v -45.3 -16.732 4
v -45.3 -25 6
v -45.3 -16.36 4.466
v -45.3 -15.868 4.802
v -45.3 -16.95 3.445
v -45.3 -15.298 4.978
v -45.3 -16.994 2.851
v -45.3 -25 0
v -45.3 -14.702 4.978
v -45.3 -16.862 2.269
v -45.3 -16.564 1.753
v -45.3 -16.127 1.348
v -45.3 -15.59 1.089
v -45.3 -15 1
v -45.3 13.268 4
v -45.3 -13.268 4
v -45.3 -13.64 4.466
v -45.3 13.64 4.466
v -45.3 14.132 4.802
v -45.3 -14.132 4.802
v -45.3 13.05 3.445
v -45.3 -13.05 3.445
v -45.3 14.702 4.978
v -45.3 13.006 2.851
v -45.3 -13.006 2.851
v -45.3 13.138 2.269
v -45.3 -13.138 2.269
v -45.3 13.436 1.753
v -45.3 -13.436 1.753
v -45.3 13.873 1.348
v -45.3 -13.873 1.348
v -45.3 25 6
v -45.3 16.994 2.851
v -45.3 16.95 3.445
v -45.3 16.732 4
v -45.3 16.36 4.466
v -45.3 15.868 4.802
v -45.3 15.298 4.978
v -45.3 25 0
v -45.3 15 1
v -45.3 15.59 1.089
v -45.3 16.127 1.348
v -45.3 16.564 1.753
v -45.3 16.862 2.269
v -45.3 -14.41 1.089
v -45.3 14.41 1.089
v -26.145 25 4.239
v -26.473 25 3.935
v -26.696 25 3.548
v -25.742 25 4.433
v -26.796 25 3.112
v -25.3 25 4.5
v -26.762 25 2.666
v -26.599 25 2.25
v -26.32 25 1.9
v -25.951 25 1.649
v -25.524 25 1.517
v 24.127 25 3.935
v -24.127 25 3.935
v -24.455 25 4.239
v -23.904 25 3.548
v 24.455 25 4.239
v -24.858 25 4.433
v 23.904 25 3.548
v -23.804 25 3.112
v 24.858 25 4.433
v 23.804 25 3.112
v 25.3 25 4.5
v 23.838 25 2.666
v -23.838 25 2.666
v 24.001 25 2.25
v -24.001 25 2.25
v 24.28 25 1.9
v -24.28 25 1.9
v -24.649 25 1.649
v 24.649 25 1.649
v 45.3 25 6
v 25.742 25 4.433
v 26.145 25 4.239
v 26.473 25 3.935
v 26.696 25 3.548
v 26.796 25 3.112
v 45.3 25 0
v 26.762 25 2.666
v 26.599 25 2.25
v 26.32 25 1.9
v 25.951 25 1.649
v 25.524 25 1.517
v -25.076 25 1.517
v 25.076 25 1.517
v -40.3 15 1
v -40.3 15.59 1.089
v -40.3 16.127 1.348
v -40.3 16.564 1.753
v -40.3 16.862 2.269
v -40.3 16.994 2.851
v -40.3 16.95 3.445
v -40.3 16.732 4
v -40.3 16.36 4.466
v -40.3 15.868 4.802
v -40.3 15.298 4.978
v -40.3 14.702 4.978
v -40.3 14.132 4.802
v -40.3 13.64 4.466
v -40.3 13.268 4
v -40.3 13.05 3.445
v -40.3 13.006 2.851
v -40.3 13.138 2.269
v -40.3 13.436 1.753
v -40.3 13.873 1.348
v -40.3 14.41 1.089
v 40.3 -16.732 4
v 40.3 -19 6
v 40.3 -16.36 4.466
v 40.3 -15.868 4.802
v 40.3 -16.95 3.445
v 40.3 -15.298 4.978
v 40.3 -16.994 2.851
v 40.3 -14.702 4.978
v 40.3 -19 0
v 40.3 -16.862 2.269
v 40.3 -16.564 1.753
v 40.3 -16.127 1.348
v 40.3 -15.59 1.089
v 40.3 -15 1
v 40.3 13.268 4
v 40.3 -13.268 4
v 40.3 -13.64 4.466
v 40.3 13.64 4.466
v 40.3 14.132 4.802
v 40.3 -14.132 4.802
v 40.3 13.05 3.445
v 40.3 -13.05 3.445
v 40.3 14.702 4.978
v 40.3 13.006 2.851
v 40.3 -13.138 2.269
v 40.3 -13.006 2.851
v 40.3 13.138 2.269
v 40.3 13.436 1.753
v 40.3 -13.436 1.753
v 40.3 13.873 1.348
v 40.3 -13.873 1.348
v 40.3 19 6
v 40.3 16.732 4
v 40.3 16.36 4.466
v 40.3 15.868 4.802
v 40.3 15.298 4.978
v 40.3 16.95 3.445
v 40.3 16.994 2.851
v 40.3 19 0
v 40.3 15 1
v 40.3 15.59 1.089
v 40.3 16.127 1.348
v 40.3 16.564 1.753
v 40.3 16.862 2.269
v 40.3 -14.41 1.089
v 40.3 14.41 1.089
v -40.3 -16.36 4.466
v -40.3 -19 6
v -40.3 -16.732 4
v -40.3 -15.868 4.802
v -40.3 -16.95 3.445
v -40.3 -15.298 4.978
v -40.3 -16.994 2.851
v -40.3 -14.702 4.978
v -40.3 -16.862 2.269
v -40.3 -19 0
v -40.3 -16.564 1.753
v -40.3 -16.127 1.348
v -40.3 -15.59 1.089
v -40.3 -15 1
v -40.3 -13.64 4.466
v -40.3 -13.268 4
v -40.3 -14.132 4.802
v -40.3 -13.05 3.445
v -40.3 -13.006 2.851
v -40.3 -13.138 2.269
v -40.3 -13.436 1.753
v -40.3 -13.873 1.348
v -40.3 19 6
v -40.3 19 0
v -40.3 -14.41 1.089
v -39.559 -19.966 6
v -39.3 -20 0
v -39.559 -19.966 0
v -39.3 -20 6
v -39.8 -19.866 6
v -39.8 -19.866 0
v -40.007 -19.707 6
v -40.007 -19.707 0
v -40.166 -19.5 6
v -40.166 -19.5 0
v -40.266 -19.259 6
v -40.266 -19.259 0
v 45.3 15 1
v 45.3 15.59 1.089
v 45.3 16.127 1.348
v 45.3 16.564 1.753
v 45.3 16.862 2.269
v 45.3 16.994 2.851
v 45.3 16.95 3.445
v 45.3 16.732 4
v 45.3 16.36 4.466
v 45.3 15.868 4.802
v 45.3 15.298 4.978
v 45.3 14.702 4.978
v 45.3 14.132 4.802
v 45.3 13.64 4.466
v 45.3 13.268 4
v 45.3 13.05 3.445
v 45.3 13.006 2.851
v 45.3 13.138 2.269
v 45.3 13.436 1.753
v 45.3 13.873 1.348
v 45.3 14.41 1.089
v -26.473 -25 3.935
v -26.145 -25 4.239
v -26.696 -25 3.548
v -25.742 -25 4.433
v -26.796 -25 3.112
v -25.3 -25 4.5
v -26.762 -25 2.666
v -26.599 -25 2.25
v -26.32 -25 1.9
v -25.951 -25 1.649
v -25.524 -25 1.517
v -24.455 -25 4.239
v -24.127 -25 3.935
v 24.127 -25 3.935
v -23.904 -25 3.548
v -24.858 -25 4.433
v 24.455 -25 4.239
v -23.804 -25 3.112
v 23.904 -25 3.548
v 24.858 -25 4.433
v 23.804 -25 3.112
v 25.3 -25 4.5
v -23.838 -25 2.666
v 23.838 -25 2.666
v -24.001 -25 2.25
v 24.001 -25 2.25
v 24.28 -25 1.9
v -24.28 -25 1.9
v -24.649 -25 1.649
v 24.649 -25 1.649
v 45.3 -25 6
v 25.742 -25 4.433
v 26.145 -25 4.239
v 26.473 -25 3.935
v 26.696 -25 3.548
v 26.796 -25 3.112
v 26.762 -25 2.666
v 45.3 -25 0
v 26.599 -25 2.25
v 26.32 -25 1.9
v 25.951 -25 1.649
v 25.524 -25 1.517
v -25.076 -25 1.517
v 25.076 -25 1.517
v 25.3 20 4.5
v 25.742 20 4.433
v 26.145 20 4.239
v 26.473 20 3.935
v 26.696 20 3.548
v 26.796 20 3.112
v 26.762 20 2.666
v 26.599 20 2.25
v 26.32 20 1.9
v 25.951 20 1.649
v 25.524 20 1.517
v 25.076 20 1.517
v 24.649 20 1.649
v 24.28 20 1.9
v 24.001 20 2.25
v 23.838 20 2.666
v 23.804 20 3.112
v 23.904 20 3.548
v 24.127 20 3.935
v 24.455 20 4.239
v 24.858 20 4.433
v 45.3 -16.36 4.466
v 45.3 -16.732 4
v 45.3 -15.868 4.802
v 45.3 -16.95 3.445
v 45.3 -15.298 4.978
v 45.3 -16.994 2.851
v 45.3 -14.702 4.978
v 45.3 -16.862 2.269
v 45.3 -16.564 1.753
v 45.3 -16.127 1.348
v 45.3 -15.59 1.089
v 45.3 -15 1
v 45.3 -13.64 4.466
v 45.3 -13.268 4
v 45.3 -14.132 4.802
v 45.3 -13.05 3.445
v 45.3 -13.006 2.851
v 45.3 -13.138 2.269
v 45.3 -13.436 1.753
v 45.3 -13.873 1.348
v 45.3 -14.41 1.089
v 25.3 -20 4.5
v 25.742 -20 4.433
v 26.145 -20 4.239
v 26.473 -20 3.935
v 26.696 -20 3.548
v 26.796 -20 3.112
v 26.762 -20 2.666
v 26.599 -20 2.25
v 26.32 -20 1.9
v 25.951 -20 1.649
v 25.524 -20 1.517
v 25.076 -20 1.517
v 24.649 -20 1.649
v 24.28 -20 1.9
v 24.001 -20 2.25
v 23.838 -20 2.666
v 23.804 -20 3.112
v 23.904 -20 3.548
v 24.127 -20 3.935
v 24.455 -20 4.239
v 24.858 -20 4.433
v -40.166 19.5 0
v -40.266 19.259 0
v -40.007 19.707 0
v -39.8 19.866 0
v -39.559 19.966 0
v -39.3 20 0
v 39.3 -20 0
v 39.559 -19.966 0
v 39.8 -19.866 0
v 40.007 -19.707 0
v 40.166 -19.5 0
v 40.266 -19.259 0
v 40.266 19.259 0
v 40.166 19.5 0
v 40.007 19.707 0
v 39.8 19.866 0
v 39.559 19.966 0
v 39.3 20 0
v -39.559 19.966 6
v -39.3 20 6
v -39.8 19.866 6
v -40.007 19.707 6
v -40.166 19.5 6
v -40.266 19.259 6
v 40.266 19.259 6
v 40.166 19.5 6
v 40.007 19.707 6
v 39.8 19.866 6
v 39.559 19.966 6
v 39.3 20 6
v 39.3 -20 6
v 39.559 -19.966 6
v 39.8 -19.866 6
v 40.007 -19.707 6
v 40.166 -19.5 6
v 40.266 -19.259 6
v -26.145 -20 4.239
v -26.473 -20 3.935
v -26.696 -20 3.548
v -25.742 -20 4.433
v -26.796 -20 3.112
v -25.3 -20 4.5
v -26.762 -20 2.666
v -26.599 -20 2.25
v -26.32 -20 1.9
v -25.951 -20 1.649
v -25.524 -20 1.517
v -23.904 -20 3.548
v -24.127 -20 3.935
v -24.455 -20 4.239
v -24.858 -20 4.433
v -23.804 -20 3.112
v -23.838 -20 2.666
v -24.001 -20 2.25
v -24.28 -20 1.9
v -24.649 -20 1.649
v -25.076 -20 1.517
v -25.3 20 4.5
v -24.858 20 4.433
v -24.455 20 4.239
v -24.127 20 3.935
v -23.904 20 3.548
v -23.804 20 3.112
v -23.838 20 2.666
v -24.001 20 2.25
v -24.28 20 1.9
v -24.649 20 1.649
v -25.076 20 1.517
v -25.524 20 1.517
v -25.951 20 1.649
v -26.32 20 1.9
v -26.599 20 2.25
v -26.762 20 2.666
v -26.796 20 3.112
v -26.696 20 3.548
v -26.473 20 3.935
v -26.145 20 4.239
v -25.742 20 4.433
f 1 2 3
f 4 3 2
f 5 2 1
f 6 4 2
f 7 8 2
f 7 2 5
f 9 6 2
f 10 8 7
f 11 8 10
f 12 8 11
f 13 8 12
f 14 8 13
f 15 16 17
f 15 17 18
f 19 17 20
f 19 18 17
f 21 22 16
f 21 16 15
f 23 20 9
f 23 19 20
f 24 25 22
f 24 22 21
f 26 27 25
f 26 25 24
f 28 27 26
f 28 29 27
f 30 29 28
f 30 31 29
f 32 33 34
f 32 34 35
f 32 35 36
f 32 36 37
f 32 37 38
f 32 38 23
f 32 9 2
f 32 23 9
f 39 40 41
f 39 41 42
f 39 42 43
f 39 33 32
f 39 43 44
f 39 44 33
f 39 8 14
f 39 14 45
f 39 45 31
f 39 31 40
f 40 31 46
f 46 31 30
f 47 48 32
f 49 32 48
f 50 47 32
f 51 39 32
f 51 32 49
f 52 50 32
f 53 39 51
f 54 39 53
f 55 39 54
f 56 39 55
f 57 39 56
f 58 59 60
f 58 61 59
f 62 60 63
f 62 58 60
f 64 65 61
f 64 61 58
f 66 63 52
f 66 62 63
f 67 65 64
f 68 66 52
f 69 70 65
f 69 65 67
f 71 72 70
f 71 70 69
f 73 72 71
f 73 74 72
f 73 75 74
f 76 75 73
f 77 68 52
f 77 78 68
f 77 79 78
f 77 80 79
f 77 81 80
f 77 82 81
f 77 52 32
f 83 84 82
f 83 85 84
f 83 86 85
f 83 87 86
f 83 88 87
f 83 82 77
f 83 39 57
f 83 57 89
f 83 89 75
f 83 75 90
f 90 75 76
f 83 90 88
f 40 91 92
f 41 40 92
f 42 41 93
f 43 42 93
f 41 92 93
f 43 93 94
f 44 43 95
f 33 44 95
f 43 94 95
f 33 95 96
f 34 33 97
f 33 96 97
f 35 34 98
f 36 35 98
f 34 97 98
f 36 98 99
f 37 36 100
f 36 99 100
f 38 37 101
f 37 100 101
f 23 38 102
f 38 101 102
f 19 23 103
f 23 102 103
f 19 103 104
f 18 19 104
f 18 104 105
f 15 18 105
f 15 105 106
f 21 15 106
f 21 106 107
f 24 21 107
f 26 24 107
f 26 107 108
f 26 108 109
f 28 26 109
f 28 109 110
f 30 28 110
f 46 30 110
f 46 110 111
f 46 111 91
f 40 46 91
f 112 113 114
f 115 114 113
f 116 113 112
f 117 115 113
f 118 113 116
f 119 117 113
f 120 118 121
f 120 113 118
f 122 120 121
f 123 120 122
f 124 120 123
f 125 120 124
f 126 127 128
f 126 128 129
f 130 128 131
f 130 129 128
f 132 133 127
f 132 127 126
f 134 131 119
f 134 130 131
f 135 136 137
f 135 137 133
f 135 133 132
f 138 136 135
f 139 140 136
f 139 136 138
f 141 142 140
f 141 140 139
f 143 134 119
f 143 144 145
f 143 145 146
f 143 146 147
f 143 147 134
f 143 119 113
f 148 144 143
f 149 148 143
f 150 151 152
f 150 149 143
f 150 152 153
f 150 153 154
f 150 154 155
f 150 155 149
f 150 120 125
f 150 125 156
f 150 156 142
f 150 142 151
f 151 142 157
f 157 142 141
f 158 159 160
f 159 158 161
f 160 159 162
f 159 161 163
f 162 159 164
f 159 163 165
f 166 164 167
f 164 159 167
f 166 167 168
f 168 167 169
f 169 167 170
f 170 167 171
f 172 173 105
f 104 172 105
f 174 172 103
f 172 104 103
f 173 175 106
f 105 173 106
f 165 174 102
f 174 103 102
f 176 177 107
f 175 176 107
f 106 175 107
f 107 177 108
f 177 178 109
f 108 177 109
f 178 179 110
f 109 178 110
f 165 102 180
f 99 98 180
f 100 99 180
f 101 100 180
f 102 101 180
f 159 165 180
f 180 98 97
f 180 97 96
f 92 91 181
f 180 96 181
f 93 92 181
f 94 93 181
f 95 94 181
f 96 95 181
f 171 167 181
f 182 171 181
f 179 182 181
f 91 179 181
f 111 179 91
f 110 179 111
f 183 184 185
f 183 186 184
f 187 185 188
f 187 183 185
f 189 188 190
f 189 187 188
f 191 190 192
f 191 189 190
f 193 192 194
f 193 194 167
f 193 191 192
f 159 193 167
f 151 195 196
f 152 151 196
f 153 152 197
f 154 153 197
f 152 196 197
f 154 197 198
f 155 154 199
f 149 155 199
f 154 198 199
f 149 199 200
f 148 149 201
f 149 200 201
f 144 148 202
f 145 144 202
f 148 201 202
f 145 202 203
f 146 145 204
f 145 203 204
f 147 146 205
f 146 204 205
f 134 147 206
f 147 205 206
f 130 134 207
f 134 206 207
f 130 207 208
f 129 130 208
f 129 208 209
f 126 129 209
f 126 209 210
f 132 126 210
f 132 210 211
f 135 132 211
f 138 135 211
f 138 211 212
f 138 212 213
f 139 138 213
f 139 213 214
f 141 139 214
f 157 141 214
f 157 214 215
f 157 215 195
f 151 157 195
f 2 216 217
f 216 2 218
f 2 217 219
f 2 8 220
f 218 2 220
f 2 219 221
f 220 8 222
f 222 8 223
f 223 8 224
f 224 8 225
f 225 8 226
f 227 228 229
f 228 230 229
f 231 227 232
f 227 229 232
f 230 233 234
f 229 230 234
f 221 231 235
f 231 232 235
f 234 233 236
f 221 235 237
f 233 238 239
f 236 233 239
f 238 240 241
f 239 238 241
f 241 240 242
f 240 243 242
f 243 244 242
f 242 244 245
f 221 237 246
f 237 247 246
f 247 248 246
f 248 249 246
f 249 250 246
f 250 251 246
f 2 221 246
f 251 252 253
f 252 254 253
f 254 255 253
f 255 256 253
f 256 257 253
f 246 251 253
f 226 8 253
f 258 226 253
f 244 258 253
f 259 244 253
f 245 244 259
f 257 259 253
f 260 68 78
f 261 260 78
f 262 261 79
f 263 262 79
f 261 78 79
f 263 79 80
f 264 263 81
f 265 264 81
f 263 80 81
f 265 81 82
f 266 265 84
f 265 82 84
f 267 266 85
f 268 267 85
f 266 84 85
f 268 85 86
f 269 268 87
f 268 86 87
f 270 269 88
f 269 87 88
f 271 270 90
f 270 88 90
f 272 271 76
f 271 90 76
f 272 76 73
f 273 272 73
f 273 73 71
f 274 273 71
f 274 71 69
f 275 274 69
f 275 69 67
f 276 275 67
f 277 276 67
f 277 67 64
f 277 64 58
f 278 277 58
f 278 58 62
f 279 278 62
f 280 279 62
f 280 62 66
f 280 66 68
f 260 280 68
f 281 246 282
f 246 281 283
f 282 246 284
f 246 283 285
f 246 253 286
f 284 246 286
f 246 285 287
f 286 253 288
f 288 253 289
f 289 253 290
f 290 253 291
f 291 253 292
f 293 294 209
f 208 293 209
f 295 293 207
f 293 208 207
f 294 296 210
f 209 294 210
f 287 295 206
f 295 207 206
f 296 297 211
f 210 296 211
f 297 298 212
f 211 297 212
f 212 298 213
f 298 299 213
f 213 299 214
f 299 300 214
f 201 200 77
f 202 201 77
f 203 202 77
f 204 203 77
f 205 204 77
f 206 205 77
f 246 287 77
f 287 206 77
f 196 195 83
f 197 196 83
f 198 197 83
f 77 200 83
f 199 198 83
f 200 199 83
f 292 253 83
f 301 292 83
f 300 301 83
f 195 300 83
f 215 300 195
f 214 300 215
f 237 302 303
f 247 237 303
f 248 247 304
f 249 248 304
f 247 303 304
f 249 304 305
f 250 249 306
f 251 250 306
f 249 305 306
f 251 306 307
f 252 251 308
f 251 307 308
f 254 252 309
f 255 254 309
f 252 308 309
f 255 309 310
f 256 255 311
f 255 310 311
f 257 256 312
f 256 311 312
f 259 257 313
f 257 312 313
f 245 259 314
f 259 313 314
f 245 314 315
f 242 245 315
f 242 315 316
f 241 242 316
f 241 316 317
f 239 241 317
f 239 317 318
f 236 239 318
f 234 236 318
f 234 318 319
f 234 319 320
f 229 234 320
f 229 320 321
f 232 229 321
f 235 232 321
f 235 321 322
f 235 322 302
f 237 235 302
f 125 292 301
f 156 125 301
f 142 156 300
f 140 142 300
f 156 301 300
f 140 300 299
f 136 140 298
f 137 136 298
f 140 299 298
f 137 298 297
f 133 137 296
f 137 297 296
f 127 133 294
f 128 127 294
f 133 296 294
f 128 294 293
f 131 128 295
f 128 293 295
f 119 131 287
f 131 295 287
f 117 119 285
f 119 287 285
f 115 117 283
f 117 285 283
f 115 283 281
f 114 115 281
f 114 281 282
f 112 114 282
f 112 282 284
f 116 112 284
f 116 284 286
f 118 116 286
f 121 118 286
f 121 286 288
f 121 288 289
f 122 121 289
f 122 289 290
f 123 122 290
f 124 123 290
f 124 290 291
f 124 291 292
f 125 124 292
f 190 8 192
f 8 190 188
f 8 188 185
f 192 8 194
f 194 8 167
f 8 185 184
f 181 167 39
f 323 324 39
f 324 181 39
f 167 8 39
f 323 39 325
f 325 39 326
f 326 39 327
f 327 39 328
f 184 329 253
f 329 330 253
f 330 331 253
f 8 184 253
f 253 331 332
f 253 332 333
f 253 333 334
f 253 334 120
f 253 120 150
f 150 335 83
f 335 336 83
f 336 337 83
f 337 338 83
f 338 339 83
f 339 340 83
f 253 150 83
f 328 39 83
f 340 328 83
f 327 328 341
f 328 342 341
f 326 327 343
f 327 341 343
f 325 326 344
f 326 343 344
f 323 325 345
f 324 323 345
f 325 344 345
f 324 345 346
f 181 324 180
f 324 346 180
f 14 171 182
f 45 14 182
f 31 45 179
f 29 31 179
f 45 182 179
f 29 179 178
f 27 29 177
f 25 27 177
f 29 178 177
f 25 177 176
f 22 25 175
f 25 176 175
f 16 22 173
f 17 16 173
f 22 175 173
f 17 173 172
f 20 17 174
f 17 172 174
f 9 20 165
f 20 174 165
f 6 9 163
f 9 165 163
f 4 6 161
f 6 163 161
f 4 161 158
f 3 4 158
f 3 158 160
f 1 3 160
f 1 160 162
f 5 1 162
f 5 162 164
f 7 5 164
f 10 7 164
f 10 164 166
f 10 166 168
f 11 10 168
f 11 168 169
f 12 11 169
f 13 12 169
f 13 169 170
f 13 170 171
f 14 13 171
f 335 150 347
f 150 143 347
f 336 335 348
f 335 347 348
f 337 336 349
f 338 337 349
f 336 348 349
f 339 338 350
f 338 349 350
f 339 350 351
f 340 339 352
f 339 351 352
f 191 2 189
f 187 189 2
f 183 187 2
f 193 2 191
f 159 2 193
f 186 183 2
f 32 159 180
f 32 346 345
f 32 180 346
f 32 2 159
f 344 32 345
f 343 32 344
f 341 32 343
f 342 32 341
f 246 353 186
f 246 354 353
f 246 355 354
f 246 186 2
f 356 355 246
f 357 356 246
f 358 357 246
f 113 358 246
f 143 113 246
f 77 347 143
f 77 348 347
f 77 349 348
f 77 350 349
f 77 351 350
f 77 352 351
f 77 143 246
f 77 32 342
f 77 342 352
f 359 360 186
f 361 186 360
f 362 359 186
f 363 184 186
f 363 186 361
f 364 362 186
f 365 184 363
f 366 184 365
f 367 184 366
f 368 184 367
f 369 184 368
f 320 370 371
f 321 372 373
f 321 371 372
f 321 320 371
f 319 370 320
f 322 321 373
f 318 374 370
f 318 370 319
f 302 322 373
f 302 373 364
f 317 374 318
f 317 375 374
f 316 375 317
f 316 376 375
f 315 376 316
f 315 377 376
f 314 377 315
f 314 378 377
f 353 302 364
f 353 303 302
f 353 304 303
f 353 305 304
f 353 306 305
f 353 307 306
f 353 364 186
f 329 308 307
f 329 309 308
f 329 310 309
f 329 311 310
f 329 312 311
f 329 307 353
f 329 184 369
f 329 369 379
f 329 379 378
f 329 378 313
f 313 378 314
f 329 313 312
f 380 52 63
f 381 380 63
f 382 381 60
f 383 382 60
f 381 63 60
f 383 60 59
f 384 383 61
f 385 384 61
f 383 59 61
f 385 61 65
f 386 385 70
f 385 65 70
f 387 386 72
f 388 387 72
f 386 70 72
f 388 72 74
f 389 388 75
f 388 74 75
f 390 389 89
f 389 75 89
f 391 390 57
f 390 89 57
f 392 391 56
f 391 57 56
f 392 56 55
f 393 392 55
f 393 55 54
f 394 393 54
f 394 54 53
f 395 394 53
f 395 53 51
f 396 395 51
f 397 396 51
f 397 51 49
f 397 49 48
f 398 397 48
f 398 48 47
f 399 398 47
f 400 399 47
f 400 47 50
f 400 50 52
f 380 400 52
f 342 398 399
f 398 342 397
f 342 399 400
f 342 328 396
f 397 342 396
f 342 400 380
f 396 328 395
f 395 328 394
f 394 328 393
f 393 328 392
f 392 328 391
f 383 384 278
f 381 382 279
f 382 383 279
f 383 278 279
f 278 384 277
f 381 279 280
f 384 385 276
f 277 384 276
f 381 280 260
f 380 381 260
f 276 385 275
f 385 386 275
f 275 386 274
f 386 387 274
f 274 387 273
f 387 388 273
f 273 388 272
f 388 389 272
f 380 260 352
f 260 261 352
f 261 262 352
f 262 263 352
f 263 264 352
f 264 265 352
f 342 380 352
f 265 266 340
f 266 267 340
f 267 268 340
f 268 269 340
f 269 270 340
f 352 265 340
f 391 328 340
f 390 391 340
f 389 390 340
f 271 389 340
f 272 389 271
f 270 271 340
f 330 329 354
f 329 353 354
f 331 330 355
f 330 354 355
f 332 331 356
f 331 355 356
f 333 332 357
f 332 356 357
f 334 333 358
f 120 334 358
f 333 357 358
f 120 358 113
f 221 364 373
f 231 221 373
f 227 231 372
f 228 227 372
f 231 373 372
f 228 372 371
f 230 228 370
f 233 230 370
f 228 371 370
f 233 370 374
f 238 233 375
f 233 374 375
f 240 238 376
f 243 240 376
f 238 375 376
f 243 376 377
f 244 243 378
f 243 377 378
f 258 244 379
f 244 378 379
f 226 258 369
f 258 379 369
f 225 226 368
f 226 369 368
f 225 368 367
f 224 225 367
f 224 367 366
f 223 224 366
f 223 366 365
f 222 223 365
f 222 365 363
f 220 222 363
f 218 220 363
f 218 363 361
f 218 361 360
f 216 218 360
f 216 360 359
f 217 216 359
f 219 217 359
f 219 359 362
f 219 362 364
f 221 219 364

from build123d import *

# Parameters (mm, degrees)
SKETCH_1_W          = 90.6
SKETCH_1_H          = 50
SKETCH_1_W_2        = 80.6
SKETCH_1_H_2        = 40
EXTRUDE_1_DEPTH     = 6
FILLET_1_R          = 1
SKETCH_2_R          = 2
CUT_EXTRUDE_1_DEPTH = 95.177279638
SKETCH_3_R          = 1.5
CUT_EXTRUDE_2_DEPTH = 68.73544124


with BuildPart() as part:
    # 草图1 → 凸台-拉伸1 (new body)
    with BuildSketch(Plane.XY):
        Rectangle(SKETCH_1_W, SKETCH_1_H)
        Rectangle(SKETCH_1_W_2, SKETCH_1_H_2, mode=Mode.SUBTRACT)
    extrude(amount=EXTRUDE_1_DEPTH)

    # 圆角1
    fillet_1_edges = [part.edges().sort_by_distance(p)[0] for p in [
        (40.3, -20, 3),
        (40.3, 20, 3),
        (-40.3, 20, 3),
        (-40.3, -20, 3),
    ]]
    fillet(fillet_1_edges, radius=FILLET_1_R)

    # 草图2 → 切除-拉伸1 (cut, through all)
    with BuildSketch(Plane(origin=(45.3, 0, 0), x_dir=(0, 0, -1), z_dir=(1, 0, 0))):
        with Locations((-3, 15)):
            Circle(SKETCH_2_R)
        with Locations((-3, -15)):
            Circle(SKETCH_2_R)
    extrude(amount=-CUT_EXTRUDE_1_DEPTH, mode=Mode.SUBTRACT)

    # 草图3 → 切除-拉伸2 (cut, through all)
    with BuildSketch(Plane(origin=(0, 25, 0), x_dir=(1, 0, 0), z_dir=(0, 1, 0))):
        with Locations(Location((-25.3, -3, 0), (0, 0, 270))):
            Circle(SKETCH_3_R)
        with Locations(Location((25.3, -3, 0), (0, 0, 270))):
            Circle(SKETCH_3_R)
    extrude(amount=-CUT_EXTRUDE_2_DEPTH, mode=Mode.SUBTRACT)


solid = part.part
